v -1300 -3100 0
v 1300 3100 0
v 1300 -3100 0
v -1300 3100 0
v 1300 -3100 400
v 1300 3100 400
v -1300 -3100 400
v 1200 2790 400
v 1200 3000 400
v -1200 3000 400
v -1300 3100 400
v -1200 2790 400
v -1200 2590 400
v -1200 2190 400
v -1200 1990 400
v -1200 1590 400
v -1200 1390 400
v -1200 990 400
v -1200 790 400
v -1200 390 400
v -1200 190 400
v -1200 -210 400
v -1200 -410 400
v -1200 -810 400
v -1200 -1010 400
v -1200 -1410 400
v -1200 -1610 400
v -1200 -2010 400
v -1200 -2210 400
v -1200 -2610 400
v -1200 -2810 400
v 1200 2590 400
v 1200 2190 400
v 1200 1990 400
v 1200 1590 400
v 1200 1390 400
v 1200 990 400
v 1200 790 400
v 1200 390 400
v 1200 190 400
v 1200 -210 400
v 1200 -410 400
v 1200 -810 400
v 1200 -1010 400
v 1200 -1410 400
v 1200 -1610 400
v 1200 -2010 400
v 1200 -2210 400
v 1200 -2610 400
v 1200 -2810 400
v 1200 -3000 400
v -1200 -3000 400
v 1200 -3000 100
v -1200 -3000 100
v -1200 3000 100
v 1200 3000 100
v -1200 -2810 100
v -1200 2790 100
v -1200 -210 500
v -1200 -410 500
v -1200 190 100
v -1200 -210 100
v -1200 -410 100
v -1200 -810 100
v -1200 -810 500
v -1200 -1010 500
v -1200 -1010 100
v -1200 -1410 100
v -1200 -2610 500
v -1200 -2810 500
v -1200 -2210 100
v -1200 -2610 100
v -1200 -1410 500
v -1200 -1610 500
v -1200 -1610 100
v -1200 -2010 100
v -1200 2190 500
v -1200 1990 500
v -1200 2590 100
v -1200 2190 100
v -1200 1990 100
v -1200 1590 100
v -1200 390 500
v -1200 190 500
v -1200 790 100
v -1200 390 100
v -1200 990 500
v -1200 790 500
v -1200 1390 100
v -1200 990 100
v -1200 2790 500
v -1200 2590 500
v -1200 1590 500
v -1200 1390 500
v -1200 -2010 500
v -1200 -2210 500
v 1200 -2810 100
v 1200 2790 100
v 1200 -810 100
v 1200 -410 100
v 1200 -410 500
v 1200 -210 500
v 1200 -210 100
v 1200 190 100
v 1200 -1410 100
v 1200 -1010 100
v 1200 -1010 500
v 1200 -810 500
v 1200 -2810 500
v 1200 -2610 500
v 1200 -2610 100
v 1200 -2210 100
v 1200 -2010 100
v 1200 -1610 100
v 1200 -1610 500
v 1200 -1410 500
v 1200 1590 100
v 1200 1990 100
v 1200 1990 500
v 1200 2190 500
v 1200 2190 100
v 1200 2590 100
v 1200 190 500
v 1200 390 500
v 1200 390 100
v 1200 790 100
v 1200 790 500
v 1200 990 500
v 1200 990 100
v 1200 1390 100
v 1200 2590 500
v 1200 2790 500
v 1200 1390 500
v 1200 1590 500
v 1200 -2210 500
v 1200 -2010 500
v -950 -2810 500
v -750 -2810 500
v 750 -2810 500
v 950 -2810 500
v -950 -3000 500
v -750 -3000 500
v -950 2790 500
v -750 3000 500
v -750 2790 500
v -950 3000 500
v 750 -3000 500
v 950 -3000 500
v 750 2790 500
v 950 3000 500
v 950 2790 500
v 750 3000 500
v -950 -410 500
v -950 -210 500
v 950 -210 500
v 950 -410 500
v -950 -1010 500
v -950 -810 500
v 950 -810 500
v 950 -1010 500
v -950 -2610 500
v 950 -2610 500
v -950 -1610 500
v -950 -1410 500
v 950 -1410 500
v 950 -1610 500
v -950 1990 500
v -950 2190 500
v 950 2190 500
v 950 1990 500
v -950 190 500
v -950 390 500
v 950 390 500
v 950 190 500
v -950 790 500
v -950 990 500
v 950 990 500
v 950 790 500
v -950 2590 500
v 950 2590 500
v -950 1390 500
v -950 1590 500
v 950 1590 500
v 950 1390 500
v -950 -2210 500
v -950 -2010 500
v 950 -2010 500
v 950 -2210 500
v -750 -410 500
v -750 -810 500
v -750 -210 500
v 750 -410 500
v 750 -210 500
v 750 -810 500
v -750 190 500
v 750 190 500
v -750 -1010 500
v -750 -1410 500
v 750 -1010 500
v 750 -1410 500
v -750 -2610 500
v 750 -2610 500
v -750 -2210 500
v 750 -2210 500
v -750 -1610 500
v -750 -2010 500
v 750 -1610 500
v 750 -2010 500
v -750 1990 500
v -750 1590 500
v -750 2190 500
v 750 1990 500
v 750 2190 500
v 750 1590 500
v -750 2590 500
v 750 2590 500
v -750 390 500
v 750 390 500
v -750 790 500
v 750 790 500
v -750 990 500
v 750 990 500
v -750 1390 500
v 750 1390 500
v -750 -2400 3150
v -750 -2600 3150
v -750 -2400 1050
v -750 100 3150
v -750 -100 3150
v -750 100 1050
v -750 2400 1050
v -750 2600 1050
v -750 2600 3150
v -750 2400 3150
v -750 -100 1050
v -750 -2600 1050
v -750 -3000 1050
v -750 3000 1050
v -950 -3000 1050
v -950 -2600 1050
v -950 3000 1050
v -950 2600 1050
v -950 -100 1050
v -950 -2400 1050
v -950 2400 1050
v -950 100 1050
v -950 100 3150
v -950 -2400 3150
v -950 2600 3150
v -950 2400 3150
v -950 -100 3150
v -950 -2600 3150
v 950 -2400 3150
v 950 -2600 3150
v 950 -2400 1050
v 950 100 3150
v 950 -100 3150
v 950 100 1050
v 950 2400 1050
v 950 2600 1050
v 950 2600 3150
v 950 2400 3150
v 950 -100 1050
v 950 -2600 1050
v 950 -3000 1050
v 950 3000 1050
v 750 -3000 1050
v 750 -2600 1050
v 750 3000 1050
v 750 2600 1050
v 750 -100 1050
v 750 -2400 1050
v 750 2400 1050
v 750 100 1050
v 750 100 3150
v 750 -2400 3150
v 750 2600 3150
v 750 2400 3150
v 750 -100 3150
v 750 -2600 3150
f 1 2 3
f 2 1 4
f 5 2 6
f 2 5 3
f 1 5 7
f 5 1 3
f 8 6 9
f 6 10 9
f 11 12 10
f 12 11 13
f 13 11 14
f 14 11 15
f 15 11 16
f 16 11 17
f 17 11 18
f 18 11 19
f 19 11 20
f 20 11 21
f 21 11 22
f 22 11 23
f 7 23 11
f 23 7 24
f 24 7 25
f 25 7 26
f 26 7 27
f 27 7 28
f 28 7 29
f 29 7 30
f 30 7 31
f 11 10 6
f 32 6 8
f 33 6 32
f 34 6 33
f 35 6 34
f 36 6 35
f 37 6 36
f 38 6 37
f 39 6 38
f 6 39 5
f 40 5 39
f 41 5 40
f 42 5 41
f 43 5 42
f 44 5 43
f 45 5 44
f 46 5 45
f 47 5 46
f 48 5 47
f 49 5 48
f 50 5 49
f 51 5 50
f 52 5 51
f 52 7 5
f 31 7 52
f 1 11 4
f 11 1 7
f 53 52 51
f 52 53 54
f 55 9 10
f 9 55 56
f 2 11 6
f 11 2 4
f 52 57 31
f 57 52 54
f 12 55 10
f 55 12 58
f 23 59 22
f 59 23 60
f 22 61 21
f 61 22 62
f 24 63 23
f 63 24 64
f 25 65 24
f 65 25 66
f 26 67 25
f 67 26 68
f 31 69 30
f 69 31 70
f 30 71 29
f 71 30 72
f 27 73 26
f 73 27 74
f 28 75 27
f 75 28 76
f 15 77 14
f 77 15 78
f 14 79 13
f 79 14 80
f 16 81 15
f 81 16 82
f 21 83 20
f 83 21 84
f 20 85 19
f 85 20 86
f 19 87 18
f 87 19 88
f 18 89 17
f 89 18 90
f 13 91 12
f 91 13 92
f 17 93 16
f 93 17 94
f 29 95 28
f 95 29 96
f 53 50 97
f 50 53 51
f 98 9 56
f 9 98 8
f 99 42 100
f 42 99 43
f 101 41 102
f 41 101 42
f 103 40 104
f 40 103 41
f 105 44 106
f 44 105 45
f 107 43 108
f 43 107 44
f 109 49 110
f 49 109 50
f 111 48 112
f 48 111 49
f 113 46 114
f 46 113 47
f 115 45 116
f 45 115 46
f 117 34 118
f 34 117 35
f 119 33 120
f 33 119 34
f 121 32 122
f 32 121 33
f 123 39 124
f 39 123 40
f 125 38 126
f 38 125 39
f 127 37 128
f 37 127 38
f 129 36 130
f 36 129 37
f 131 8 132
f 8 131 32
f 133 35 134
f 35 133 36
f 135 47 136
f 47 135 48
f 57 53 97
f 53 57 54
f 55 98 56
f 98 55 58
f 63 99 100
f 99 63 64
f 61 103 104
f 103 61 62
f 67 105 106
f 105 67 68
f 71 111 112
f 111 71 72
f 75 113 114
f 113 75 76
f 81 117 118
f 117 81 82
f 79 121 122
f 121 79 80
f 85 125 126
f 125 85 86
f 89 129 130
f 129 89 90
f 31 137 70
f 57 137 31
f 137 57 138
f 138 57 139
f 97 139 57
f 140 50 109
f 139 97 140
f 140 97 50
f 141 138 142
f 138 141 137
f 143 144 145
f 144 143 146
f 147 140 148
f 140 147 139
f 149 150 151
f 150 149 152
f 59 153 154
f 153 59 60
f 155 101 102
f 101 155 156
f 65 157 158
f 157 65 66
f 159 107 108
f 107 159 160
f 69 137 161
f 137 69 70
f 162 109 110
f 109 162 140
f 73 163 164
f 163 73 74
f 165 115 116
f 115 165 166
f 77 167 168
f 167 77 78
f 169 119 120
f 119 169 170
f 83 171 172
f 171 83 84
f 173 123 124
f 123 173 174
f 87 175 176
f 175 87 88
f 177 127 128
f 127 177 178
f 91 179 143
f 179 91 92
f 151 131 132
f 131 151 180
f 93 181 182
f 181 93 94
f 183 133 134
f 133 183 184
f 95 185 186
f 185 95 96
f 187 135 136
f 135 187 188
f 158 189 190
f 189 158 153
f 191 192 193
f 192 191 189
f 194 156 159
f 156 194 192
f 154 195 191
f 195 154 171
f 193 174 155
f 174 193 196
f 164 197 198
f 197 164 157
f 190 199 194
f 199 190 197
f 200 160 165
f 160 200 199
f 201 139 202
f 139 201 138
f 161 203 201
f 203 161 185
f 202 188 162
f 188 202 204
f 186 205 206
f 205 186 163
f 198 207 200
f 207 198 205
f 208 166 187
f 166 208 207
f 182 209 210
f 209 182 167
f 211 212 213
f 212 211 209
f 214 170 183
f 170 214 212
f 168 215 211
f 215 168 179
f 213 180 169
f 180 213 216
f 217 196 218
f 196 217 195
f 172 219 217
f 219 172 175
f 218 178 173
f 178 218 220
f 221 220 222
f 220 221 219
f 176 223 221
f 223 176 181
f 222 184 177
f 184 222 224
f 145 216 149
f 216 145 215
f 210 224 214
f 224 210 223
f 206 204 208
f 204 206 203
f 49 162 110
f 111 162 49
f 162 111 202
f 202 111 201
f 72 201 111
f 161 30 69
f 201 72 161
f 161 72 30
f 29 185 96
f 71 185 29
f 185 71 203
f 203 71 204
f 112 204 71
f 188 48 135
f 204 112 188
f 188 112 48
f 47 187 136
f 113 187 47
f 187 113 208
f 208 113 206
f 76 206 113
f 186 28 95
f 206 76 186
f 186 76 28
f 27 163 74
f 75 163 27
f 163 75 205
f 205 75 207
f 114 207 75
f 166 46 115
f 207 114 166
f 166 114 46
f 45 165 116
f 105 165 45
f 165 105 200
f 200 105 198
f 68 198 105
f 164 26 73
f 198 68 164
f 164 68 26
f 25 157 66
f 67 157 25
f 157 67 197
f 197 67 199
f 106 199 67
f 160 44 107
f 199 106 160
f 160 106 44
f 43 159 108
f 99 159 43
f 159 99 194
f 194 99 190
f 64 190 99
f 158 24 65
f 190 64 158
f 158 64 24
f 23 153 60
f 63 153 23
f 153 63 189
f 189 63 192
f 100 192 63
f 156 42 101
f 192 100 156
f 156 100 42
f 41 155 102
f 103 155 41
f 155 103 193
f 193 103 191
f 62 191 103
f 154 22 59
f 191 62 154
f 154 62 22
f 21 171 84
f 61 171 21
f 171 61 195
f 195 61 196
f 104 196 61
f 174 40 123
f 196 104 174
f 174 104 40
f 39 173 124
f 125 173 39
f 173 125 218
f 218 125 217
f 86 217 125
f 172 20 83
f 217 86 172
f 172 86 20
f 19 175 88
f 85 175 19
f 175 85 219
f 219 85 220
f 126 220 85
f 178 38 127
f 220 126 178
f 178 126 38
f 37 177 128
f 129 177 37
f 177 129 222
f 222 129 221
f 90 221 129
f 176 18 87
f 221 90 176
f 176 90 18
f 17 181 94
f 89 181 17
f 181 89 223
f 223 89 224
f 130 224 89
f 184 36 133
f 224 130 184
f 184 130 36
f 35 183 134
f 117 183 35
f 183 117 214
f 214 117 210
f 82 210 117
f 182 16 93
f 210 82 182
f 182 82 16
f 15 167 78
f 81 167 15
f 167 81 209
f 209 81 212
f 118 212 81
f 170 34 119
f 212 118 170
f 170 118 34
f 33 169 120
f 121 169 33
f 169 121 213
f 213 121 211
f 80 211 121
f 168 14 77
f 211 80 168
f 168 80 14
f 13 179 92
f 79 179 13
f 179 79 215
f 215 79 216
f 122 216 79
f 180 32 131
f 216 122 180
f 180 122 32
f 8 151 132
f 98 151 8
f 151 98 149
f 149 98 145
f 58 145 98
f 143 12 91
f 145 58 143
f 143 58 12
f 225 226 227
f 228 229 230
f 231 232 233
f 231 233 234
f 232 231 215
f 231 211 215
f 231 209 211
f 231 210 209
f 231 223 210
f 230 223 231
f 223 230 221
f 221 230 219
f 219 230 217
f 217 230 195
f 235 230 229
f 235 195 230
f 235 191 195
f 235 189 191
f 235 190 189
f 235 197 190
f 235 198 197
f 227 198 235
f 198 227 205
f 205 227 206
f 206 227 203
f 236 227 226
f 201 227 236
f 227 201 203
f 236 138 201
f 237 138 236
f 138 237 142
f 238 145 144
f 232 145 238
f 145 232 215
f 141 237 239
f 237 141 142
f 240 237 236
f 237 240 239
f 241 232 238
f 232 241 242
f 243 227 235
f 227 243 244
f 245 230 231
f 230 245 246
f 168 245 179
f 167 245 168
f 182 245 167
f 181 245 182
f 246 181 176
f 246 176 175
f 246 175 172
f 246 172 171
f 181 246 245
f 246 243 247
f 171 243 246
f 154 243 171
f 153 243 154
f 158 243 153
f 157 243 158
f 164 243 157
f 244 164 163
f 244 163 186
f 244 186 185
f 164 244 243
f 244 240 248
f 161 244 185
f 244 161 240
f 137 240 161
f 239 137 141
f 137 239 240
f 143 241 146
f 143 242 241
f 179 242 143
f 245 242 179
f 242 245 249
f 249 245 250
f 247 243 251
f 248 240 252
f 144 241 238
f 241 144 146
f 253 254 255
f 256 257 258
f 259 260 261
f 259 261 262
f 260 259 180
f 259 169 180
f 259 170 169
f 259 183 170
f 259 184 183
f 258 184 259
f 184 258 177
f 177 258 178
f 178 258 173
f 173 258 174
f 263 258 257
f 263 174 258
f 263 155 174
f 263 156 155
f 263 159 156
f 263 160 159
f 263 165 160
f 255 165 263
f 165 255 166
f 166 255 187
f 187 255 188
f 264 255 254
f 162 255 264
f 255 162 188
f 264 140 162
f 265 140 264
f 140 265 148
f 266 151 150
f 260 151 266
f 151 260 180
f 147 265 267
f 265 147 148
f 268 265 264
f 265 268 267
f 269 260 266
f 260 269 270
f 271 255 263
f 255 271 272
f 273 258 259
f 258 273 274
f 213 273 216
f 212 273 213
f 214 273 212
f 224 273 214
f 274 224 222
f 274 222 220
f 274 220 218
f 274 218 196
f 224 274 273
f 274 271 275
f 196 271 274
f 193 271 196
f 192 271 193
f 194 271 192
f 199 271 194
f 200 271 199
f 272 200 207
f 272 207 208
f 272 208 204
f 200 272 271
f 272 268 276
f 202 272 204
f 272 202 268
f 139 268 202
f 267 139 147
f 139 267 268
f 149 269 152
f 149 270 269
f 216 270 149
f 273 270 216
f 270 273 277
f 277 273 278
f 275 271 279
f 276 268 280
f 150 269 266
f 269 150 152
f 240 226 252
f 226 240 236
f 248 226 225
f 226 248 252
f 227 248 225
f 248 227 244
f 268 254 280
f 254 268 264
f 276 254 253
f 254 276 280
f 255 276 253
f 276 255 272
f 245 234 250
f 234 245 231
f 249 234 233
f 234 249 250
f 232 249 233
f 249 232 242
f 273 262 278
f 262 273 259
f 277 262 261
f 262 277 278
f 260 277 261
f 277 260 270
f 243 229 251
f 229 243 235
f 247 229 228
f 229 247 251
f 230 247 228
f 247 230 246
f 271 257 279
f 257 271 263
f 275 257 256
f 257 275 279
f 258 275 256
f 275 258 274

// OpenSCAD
union()
{
    linear_extrude(height = 100.0, twist = 0.0, scale = 1.0, slices = 1, center = false)
    {
        scale([2400.0, 6000.0])
        {
            M8();
        }
    }
    union()
    {
        translate([0.0, -3050.0, 0.0])
        {
            linear_extrude(height = 400.0, twist = 0.0, scale = 1.0, slices = 1, center = false)
            {
                scale([2600.0, 100.0])
                {
                    M8();
                }
            }
        }
        translate([0.0, 3050.0, 0.0])
        {
            linear_extrude(height = 400.0, twist = 0.0, scale = 1.0, slices = 1, center = false)
            {
                scale([2600.0, 100.0])
                {
                    M8();
                }
            }
        }
        translate([-1250.0, 0.0, 0.0])
        {
            linear_extrude(height = 400.0, twist = 0.0, scale = 1.0, slices = 1, center = false)
            {
                scale([100.0, 6100.0])
                {
                    M8();
                }
            }
        }
        translate([1250.0, 0.0, 0.0])
        {
            linear_extrude(height = 400.0, twist = 0.0, scale = 1.0, slices = 1, center = false)
            {
                scale([100.0, 6100.0])
                {
                    M8();
                }
            }
        }
    }
    union()
    {
        translate([0.0, -2710.0, 100.0])
        {
            linear_extrude(height = 400.0, twist = 0.0, scale = 1.0, slices = 1, center = false)
            {
                scale([2400.0, 200.0])
                {
                    M8();
                }
            }
        }
        translate([0.0, -2110.0, 100.0])
        {
            linear_extrude(height = 400.0, twist = 0.0, scale = 1.0, slices = 1, center = false)
            {
                scale([2400.0, 200.0])
                {
                    M8();
                }
            }
        }
        translate([0.0, -1510.0, 100.0])
        {
            linear_extrude(height = 400.0, twist = 0.0, scale = 1.0, slices = 1, center = false)
            {
                scale([2400.0, 200.0])
                {
                    M8();
                }
            }
        }
        translate([0.0, -910.0, 100.0])
        {
            linear_extrude(height = 400.0, twist = 0.0, scale = 1.0, slices = 1, center = false)
            {
                scale([2400.0, 200.0])
                {
                    M8();
                }
            }
        }
        translate([0.0, -310.0, 100.0])
        {
            linear_extrude(height = 400.0, twist = 0.0, scale = 1.0, slices = 1, center = false)
            {
                scale([2400.0, 200.0])
                {
                    M8();
                }
            }
        }
        translate([0.0, 290.0, 100.0])
        {
            linear_extrude(height = 400.0, twist = 0.0, scale = 1.0, slices = 1, center = false)
            {
                scale([2400.0, 200.0])
                {
                    M8();
                }
            }
        }
        translate([0.0, 890.0, 100.0])
        {
            linear_extrude(height = 400.0, twist = 0.0, scale = 1.0, slices = 1, center = false)
            {
                scale([2400.0, 200.0])
                {
                    M8();
                }
            }
        }
        translate([0.0, 1490.0, 100.0])
        {
            linear_extrude(height = 400.0, twist = 0.0, scale = 1.0, slices = 1, center = false)
            {
                scale([2400.0, 200.0])
                {
                    M8();
                }
            }
        }
        translate([0.0, 2090.0, 100.0])
        {
            linear_extrude(height = 400.0, twist = 0.0, scale = 1.0, slices = 1, center = false)
            {
                scale([2400.0, 200.0])
                {
                    M8();
                }
            }
        }
        translate([0.0, 2690.0, 100.0])
        {
            linear_extrude(height = 400.0, twist = 0.0, scale = 1.0, slices = 1, center = false)
            {
                scale([2400.0, 200.0])
                {
                    M8();
                }
            }
        }
    }
    union()
    {
        translate([-850.0, 0.0, 500.0])
        {
            linear_extrude(height = 550.0, twist = 0.0, scale = 1.0, slices = 1, center = false)
            {
                scale([200.0, 6000.0])
                {
                    M8();
                }
            }
        }
        translate([850.0, 0.0, 500.0])
        {
            linear_extrude(height = 550.0, twist = 0.0, scale = 1.0, slices = 1, center = false)
            {
                scale([200.0, 6000.0])
                {
                    M8();
                }
            }
        }
    }
    union()
    {
        translate([-850.0, -2500.0, 1050.0])
        {
            linear_extrude(height = 2100.0, twist = 0.0, scale = 1.0, slices = 1, center = false)
            {
                scale([200.0, 200.0])
                {
                    M8();
                }
            }
        }
        translate([850.0, -2500.0, 1050.0])
        {
            linear_extrude(height = 2100.0, twist = 0.0, scale = 1.0, slices = 1, center = false)
            {
                scale([200.0, 200.0])
                {
                    M8();
                }
            }
        }
        translate([-850.0, 2500.0, 1050.0])
        {
            linear_extrude(height = 2100.0, twist = 0.0, scale = 1.0, slices = 1, center = false)
            {
                scale([200.0, 200.0])
                {
                    M8();
                }
            }
        }
        translate([850.0, 2500.0, 1050.0])
        {
            linear_extrude(height = 2100.0, twist = 0.0, scale = 1.0, slices = 1, center = false)
            {
                scale([200.0, 200.0])
                {
                    M8();
                }
            }
        }
        translate([-850.0, 0.0, 1050.0])
        {
            linear_extrude(height = 2100.0, twist = 0.0, scale = 1.0, slices = 1, center = false)
            {
                scale([200.0, 200.0])
                {
                    M8();
                }
            }
        }
        translate([850.0, 0.0, 1050.0])
        {
            linear_extrude(height = 2100.0, twist = 0.0, scale = 1.0, slices = 1, center = false)
            {
                scale([200.0, 200.0])
                {
                    M8();
                }
            }
        }
    }
}

module M8()
{
    polygon
    (
        points =
        [
            [-0.5, -0.5], 
            [0.5, -0.5], 
            [0.5, 0.5], 
            [-0.5, 0.5]
        ],
        paths =
        [
            [0, 1, 2, 3]
        ]
    );
}
